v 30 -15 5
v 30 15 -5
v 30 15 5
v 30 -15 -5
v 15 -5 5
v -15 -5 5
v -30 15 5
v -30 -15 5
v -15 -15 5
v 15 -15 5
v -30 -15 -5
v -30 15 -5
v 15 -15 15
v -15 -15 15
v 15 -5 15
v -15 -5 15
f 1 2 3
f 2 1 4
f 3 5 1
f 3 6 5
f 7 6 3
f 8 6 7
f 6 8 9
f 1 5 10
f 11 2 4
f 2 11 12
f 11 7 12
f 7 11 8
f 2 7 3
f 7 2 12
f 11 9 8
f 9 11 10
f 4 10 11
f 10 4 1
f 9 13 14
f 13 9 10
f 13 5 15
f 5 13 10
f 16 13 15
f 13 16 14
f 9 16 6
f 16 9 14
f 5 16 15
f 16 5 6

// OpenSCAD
// file: ../Configuration.scad
// Puzzlebox Telekinesis
// component: Configuration
//
// by Puzzlebox Productions 
// http://puzzlebox.io/telekinesis
//
// Copyright Puzzlebox Productions, LLC (2016)


// Design
// Note: All measurements are in mm

// ##################################################################

// PCB

pcb_length = 60;
pcb_width = 30;
pcb_height = 10;

pcb_header_pins_length = 30;
pcb_header_pins_width = 10;
pcb_head_pins_height = 10;


// ##################################################################

electrode_screw_diameter = 2; // mm

frame_height=2.5;
frame_width_vertical=6;
frame_width_horizontal=4;

frame_scale_fri=1.1;

// ##################################################################

// C3

head_small_distance_c3_to_c1 = 30; // top
head_small_distance_c3_to_cp3 = 35; // right
head_small_distance_c3_to_c5 = 33; // bottom
head_small_distance_c3_to_fc3 = 32; // left

c3_render_orb_frame = false;


// ##################################################################

// Cz

head_small_distance_cz_to_fcz = 38; // forward
head_small_distance_cz_to_c2 = 38; // right
head_small_distance_cz_to_cpz = 40; // back
head_small_distance_cz_to_c1 = 38; // left

cz_rotate_c2 = 30; // right
cz_rotate_c1 = -30; // left

// ##################################################################

// Electrode Mount

mount_height = 3.0;
mount_length = 20;
mount_width = 5;


// ##################################################################

// Florida Research Instruments (FRI)
electrode_fri_height = 5;
electrode_fri_diameter = 10;
electrode_fri_mount_diameter = 5;

electrode_fri_skin_inner = 7.5;

lead_wire_fri_clip_length = 20; // mm
lead_wire_fri_clip_height = 2;


// ##################################################################

// Cognionics

// Cognionics female snap electrode
snap_electrode_cognionics_female_outer_diameter = 12; // mm
snap_electrode_cognionics_female_outer_height = 1.25;

snap_electrode_cognionics_female_inner_diameter = 3;
snap_electrode_cognionics_female_inner_height = 1.75;


// Cognonics male snap electrode (skin)
snap_electrode_cognionics_male_skin_outer_diameter = 19;
snap_electrode_cognionics_male_skin_outer_height = 3.75;

snap_electrode_cognionics_assembled_skin_height = 7;


// Cognionics male snape electrode (hair)
snap_electrode_cognionics_male_hair_outer_diameter = 19;
snap_electrode_cognionics_male_hair_outer_height = 10.5;

snap_electrode_cognionics_assembled_hair_height = 12.5;
// main file
// Puzzlebox Telekinesis
// component: CZ (Feet)
//
// by Puzzlebox Productions 
// http://puzzlebox.io/telekinesis
//
// Copyright Puzzlebox Productions, LLC (2016)


include <../Configuration.scad>


// ##################################################################

module pcb() {
	
	color("darkgreen", 0.8)
		cube([pcb_length, pcb_width, pcb_height], center=true);
	
	translate([0,
	           (-pcb_width/2) + (pcb_header_pins_width/2),
	           pcb_head_pins_height])
	color("darkgrey", 0.8)
		cube([pcb_header_pins_length, pcb_header_pins_width, pcb_head_pins_height], center=true);
	
	
}

// ##################################################################

pcb();
